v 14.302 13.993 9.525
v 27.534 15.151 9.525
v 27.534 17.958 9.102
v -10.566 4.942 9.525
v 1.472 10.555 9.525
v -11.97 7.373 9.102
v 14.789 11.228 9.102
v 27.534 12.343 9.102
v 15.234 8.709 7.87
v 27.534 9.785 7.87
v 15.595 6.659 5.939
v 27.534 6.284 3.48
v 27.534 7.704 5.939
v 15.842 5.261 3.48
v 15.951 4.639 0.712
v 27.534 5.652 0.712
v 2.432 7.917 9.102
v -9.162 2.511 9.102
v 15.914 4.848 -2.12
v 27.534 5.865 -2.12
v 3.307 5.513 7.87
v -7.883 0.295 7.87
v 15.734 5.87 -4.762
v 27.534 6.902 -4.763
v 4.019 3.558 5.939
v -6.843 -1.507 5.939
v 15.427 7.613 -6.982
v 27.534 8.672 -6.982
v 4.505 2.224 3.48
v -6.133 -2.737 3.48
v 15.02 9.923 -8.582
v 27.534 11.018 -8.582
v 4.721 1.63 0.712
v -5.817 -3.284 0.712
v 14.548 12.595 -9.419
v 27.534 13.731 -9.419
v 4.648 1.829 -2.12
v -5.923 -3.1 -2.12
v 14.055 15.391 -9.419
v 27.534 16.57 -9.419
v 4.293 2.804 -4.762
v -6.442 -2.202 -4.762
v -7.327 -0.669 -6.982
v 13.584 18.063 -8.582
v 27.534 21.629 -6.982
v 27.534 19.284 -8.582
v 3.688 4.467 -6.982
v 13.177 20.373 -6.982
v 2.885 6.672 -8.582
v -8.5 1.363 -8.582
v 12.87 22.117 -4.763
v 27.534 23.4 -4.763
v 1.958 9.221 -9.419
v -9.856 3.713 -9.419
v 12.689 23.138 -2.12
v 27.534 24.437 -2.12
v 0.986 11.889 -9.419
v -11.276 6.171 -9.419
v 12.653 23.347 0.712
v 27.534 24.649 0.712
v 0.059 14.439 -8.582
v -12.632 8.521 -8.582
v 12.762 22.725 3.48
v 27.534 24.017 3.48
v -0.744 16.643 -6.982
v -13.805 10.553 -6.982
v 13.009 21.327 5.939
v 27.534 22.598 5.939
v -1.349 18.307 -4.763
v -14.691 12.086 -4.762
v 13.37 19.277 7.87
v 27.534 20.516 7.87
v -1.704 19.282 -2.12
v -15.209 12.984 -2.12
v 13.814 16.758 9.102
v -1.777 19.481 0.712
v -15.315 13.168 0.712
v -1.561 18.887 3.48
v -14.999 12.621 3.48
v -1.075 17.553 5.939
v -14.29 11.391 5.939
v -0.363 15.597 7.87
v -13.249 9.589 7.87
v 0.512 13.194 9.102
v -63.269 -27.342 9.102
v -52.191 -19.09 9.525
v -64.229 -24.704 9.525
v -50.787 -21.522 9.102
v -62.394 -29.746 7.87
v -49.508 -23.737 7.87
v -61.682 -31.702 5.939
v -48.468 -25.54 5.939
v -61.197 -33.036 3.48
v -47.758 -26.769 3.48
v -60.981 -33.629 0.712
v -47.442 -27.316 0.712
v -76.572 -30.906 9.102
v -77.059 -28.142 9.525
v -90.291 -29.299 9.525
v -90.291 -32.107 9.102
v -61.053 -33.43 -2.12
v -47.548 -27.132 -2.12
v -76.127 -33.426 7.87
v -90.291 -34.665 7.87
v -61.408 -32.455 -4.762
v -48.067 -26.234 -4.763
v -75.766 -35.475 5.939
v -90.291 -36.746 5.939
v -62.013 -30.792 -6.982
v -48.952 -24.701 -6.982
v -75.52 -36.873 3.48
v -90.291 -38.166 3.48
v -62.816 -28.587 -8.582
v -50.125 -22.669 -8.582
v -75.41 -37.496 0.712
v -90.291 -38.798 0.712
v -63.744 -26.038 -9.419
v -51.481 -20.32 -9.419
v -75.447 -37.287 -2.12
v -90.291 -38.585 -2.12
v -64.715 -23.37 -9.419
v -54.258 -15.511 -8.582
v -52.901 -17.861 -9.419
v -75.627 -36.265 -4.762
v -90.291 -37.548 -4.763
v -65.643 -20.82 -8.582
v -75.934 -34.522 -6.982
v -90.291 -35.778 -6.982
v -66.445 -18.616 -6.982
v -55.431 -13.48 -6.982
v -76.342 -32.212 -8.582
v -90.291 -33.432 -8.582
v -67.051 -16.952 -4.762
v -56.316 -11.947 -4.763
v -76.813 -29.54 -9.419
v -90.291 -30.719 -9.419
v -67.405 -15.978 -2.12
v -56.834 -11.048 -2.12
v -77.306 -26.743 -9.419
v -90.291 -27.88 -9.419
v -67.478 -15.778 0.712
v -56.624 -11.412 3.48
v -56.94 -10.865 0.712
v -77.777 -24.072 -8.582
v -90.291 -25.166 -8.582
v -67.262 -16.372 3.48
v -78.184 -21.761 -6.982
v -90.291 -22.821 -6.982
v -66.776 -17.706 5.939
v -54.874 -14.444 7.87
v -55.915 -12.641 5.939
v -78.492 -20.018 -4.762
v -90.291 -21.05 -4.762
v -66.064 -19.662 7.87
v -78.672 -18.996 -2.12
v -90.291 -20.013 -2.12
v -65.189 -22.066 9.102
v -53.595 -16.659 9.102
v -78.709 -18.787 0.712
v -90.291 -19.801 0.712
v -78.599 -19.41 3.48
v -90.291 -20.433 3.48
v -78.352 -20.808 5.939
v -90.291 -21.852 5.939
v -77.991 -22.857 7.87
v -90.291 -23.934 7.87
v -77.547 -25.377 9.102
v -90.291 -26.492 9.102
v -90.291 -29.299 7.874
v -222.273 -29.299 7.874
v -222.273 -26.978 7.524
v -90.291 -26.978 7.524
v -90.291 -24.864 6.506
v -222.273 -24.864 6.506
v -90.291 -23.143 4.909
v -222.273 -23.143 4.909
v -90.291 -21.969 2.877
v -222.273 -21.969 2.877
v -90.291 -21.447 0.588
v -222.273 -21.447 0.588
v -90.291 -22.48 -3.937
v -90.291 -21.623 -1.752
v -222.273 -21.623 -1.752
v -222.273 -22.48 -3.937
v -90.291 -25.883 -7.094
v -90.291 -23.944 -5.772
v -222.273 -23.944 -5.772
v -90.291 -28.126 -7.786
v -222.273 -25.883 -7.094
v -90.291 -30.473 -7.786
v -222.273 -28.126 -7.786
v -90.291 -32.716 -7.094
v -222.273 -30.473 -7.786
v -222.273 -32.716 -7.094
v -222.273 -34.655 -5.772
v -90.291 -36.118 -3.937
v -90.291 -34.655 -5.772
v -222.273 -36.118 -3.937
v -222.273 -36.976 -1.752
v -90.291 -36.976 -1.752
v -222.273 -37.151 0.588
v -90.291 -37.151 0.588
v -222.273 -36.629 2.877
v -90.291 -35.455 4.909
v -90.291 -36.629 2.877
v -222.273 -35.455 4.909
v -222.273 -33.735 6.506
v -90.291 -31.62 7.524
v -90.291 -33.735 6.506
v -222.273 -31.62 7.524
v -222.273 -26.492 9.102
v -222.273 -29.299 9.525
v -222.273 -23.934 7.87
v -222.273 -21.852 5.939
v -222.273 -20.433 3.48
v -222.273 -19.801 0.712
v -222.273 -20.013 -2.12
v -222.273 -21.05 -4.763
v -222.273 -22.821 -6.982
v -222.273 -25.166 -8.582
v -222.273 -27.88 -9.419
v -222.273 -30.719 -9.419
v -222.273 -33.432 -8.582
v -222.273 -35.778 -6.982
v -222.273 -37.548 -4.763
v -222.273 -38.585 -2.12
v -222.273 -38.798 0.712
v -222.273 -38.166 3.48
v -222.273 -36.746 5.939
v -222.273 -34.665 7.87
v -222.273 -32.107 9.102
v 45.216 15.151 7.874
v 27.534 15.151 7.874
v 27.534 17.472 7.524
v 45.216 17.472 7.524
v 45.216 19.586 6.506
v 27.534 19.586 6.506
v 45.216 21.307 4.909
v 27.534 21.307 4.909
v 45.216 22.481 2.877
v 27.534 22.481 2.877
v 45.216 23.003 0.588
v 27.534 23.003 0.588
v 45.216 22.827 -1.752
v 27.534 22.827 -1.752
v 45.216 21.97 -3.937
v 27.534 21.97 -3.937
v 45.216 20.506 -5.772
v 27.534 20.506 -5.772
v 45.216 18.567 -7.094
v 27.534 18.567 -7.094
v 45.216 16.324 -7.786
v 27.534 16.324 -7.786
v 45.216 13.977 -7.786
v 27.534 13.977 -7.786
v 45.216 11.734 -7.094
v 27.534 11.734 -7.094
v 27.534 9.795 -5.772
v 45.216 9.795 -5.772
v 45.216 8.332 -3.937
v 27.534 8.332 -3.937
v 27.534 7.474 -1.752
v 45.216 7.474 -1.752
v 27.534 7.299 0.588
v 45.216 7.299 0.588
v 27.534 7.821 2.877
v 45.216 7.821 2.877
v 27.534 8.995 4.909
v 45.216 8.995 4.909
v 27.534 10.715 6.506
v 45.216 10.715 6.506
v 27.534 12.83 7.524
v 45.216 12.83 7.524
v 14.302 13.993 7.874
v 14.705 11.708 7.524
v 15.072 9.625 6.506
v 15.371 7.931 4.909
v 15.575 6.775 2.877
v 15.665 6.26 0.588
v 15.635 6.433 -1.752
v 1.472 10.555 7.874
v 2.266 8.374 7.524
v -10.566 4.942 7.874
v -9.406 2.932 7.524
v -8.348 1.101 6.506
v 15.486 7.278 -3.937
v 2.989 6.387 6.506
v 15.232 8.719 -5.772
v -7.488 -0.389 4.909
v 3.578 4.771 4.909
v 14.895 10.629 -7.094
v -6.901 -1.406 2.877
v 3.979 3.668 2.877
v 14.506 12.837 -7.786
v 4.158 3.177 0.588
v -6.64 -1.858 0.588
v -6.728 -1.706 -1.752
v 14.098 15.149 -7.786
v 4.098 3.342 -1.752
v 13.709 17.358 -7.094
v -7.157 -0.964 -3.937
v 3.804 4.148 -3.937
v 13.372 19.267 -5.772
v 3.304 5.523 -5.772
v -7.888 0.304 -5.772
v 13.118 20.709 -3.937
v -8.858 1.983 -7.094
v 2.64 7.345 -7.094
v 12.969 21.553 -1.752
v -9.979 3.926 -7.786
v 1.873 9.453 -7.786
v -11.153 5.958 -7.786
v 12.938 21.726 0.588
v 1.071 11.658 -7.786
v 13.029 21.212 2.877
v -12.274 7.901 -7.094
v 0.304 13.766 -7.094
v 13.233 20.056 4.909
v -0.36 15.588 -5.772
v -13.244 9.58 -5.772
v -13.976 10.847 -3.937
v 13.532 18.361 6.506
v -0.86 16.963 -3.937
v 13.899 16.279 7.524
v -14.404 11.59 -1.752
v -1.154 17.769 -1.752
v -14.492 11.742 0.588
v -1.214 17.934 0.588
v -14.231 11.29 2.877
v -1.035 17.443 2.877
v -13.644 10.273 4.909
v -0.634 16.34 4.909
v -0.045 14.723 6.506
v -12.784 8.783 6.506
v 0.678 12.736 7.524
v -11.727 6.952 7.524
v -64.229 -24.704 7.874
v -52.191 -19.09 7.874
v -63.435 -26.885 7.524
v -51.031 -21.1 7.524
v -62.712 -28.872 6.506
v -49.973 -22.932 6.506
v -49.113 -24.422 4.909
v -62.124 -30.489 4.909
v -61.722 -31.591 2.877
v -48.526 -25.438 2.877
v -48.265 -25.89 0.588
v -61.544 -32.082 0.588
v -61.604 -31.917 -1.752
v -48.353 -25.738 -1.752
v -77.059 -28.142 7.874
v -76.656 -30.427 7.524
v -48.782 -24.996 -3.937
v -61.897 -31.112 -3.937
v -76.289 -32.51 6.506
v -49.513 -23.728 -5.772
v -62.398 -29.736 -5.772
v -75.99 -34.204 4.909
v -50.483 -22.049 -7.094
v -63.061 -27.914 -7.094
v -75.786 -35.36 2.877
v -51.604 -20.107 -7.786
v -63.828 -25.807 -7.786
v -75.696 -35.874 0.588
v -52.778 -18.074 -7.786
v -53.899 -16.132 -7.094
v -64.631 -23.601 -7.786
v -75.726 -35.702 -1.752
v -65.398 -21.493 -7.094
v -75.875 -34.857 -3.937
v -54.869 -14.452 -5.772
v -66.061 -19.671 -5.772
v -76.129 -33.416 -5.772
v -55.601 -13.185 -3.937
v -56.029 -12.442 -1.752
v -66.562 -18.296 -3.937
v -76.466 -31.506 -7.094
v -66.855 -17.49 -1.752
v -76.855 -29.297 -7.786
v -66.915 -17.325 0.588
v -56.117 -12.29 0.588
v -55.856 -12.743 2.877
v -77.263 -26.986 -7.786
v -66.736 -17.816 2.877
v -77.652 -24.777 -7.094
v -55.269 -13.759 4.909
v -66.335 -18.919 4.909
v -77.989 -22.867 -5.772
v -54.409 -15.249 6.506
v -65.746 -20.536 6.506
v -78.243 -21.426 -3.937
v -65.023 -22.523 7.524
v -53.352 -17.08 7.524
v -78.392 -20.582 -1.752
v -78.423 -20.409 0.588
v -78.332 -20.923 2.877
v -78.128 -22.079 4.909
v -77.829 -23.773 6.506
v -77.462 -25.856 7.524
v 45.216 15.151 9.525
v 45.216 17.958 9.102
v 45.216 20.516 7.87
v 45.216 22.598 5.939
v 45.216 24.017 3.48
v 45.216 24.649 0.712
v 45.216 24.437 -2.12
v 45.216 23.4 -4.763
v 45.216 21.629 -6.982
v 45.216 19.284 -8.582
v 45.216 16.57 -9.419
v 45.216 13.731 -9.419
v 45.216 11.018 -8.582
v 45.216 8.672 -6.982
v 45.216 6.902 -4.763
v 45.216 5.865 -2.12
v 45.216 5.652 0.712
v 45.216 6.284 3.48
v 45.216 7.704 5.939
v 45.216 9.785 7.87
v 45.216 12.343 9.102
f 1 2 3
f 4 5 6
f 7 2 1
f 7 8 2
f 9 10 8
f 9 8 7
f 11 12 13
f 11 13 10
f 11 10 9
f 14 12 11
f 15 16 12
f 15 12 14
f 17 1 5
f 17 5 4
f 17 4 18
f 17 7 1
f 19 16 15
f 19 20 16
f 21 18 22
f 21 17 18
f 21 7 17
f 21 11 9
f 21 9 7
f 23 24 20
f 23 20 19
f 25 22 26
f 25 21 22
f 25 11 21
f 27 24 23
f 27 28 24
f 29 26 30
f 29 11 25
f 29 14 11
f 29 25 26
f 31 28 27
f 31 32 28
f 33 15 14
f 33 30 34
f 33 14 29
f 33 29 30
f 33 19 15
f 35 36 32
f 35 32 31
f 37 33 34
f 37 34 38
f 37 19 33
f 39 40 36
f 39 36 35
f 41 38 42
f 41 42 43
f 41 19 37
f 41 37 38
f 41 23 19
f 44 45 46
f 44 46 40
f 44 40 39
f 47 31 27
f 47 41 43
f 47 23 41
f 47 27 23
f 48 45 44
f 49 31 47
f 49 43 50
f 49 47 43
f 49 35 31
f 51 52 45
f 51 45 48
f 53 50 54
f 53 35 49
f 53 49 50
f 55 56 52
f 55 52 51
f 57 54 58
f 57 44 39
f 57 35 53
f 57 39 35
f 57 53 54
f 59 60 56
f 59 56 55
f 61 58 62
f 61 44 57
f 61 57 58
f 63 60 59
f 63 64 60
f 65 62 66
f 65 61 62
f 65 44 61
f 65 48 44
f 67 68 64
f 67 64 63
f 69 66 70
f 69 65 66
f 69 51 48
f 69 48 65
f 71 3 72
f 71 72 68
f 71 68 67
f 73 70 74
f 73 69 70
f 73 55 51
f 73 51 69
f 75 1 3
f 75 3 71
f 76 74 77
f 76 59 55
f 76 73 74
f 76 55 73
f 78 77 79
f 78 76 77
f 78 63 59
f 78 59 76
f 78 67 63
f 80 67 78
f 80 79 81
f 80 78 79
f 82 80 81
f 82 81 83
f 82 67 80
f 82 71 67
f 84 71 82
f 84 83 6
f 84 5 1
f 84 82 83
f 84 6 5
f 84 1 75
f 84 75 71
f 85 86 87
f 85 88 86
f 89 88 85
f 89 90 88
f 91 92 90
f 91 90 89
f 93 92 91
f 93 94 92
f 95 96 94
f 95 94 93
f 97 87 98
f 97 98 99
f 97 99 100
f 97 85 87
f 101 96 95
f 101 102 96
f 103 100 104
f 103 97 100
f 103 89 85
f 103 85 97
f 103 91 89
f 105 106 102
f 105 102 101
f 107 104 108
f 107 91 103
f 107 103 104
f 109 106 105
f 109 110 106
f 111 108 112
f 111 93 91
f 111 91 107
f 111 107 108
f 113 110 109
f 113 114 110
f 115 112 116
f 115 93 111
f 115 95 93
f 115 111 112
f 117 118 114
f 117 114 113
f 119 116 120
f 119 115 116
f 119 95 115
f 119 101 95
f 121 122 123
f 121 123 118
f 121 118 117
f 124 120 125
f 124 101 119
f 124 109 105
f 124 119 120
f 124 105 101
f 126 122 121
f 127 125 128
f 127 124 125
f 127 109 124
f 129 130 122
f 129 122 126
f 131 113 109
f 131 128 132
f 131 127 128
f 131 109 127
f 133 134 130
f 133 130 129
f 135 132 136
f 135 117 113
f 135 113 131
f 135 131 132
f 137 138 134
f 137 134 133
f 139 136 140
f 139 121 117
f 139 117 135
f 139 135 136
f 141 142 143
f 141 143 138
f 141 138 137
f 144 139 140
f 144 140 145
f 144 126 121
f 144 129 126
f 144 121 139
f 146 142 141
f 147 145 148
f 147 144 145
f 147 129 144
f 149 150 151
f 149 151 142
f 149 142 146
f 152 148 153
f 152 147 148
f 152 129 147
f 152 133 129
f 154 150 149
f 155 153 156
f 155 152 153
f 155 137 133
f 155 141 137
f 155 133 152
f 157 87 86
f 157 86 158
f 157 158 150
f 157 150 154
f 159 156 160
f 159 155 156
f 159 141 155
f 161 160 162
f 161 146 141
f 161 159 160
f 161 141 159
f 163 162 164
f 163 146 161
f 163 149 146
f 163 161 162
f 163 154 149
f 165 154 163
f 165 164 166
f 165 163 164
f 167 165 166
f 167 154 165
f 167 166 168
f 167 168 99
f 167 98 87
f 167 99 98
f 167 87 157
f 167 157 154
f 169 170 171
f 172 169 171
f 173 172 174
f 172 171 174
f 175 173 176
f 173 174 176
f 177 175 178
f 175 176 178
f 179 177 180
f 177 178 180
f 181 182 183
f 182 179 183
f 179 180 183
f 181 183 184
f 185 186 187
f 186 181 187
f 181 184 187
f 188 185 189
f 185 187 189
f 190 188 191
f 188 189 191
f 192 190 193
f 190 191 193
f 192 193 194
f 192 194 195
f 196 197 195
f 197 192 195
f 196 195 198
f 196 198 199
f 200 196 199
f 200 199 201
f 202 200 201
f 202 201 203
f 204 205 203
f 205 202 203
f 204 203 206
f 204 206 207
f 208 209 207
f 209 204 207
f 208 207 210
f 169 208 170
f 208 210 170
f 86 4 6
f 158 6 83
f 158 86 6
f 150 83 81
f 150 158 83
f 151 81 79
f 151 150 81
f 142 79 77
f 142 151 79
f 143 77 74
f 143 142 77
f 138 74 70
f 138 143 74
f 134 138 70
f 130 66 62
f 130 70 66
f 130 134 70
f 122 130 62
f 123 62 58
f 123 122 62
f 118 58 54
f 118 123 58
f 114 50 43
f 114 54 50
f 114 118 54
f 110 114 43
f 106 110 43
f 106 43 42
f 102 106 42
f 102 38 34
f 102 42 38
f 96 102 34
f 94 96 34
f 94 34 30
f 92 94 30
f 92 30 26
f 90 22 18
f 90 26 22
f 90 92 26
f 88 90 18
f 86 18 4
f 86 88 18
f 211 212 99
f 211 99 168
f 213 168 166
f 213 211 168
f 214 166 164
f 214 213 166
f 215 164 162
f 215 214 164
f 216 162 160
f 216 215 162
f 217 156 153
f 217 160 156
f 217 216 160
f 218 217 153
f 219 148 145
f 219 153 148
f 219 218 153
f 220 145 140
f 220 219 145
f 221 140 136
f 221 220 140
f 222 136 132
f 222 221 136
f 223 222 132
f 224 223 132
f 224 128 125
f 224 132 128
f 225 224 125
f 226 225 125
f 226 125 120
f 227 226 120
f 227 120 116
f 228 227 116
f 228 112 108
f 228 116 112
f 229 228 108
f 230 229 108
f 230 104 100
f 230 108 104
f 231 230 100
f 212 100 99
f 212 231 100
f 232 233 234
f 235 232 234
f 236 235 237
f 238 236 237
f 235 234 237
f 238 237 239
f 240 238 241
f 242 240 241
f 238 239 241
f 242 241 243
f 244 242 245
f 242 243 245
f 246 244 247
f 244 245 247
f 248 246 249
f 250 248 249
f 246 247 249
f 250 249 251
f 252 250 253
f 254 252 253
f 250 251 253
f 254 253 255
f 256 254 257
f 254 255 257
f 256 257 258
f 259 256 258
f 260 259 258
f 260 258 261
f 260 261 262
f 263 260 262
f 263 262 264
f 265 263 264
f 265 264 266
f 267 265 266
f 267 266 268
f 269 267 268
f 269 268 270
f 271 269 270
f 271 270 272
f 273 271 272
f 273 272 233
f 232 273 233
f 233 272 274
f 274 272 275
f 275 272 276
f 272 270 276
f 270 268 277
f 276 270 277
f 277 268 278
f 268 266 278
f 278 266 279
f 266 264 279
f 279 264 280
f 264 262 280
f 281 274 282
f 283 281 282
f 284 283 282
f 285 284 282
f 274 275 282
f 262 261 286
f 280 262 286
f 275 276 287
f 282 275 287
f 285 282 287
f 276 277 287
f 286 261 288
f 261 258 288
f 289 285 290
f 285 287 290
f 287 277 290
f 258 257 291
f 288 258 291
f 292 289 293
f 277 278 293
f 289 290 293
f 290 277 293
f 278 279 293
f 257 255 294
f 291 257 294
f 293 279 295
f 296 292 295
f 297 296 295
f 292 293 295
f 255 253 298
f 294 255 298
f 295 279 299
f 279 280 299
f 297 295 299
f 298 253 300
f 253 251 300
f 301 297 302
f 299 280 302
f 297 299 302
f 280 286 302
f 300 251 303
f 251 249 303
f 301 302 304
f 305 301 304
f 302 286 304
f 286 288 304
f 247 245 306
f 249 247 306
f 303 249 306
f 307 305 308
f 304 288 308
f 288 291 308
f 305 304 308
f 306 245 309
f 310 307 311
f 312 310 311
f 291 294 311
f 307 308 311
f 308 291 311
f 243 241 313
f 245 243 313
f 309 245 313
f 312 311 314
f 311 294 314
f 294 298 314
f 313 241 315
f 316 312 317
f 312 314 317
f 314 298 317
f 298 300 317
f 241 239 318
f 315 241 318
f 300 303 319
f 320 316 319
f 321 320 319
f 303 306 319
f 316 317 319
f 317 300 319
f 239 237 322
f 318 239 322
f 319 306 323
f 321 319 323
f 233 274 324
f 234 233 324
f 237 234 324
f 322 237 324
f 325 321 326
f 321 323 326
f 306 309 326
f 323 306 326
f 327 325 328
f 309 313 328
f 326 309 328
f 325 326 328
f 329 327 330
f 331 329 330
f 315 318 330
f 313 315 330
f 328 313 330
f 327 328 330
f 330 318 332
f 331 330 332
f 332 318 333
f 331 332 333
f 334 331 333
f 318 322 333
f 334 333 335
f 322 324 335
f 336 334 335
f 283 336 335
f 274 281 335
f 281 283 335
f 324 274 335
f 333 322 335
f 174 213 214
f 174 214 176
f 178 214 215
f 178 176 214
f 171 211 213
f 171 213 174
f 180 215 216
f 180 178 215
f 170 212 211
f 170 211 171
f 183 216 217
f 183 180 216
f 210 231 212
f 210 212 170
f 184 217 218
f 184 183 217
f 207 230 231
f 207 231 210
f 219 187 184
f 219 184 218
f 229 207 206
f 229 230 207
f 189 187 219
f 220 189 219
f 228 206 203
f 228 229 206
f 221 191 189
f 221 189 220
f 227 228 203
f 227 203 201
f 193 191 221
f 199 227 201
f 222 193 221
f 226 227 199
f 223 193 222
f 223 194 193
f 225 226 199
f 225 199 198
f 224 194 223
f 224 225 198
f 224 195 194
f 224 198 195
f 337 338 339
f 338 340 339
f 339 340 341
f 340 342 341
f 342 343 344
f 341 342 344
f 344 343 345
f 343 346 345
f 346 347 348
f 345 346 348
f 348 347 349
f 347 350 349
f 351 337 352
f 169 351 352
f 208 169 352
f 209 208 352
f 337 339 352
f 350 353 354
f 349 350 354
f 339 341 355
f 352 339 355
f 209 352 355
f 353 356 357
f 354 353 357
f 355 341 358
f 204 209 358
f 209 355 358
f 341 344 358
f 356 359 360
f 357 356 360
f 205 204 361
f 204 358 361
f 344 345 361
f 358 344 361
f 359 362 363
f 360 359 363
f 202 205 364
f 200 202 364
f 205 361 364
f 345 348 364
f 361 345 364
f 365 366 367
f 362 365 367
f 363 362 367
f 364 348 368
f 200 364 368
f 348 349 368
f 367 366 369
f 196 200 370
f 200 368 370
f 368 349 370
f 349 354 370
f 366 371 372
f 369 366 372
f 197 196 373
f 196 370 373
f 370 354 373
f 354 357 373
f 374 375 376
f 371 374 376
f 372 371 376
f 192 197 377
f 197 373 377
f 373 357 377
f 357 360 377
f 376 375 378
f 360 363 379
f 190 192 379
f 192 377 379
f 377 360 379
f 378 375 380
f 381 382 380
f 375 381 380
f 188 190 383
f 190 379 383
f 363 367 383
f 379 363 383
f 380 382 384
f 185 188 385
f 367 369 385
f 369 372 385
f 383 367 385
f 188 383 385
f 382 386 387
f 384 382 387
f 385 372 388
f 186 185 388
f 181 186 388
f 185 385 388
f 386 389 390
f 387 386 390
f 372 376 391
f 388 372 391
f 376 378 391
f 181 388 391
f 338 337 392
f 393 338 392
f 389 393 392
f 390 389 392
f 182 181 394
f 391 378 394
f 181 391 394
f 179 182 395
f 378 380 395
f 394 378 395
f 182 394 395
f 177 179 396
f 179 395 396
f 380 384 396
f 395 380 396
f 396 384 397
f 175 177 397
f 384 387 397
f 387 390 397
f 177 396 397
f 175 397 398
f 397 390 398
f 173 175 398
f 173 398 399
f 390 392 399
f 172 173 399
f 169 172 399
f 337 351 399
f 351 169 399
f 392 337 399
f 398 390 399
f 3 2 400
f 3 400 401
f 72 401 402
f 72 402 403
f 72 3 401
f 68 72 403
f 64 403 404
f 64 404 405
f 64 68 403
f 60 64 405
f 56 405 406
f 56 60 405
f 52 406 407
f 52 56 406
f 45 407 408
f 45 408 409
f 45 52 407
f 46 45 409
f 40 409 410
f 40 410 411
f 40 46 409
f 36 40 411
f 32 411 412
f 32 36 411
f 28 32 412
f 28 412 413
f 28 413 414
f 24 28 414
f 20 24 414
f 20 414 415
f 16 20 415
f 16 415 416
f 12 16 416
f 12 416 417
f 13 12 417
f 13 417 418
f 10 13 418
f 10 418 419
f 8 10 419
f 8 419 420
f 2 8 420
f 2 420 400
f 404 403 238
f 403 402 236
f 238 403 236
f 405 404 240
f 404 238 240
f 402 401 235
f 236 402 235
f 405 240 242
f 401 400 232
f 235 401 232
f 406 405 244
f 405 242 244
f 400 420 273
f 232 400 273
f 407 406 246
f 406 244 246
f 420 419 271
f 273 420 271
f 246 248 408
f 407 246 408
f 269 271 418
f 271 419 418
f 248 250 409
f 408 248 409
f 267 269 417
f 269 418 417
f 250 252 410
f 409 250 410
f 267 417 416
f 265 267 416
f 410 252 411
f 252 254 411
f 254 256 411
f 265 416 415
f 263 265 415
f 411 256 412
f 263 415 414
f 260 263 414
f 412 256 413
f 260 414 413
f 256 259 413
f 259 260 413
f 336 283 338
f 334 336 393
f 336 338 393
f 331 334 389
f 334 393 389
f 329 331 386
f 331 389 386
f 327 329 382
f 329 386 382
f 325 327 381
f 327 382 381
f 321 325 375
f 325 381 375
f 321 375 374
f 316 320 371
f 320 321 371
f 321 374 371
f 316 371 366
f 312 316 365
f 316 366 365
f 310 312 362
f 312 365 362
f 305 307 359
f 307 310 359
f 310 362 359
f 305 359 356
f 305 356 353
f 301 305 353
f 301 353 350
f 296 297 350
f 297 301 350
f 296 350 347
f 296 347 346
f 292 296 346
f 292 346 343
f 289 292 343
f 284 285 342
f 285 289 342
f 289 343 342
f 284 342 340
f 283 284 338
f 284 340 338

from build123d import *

# Parameters (mm, degrees)
SKETCH5_R   = 9.525
SKETCH5_R_2 = 7.874


with BuildPart() as part:
    # Sweep1: sweep along a path in Sketch4
    with BuildLine(Plane.XY) as sweep1_path:
        Line((45.216188471, 15.150806357), (27.533916935, 15.150806357))
        ThreePointArc((27.533916935, 15.150806357), (7.811905698, 12.55435432), (-10.566083065, 4.941942125))
        Line((-10.566083065, 4.941942125), (-52.191198388, -19.090329412))
        ThreePointArc((-52.191198388, -19.090329412), (-70.569187152, -26.702741607), (-90.291198388, -29.299193643))
        Line((-90.291198388, -29.299193643), (-222.273469925, -29.299193643))
    # Sketch5 → Sweep1 (sweep)
    with BuildSketch(Plane(origin=(45.216188471, 15.150806357, 0), x_dir=(0, 0, 1), z_dir=(-1, 0, 0))):
        Circle(SKETCH5_R)
        Circle(SKETCH5_R_2, mode=Mode.SUBTRACT)
    sweep(path=sweep1_path.line)


solid = part.part
